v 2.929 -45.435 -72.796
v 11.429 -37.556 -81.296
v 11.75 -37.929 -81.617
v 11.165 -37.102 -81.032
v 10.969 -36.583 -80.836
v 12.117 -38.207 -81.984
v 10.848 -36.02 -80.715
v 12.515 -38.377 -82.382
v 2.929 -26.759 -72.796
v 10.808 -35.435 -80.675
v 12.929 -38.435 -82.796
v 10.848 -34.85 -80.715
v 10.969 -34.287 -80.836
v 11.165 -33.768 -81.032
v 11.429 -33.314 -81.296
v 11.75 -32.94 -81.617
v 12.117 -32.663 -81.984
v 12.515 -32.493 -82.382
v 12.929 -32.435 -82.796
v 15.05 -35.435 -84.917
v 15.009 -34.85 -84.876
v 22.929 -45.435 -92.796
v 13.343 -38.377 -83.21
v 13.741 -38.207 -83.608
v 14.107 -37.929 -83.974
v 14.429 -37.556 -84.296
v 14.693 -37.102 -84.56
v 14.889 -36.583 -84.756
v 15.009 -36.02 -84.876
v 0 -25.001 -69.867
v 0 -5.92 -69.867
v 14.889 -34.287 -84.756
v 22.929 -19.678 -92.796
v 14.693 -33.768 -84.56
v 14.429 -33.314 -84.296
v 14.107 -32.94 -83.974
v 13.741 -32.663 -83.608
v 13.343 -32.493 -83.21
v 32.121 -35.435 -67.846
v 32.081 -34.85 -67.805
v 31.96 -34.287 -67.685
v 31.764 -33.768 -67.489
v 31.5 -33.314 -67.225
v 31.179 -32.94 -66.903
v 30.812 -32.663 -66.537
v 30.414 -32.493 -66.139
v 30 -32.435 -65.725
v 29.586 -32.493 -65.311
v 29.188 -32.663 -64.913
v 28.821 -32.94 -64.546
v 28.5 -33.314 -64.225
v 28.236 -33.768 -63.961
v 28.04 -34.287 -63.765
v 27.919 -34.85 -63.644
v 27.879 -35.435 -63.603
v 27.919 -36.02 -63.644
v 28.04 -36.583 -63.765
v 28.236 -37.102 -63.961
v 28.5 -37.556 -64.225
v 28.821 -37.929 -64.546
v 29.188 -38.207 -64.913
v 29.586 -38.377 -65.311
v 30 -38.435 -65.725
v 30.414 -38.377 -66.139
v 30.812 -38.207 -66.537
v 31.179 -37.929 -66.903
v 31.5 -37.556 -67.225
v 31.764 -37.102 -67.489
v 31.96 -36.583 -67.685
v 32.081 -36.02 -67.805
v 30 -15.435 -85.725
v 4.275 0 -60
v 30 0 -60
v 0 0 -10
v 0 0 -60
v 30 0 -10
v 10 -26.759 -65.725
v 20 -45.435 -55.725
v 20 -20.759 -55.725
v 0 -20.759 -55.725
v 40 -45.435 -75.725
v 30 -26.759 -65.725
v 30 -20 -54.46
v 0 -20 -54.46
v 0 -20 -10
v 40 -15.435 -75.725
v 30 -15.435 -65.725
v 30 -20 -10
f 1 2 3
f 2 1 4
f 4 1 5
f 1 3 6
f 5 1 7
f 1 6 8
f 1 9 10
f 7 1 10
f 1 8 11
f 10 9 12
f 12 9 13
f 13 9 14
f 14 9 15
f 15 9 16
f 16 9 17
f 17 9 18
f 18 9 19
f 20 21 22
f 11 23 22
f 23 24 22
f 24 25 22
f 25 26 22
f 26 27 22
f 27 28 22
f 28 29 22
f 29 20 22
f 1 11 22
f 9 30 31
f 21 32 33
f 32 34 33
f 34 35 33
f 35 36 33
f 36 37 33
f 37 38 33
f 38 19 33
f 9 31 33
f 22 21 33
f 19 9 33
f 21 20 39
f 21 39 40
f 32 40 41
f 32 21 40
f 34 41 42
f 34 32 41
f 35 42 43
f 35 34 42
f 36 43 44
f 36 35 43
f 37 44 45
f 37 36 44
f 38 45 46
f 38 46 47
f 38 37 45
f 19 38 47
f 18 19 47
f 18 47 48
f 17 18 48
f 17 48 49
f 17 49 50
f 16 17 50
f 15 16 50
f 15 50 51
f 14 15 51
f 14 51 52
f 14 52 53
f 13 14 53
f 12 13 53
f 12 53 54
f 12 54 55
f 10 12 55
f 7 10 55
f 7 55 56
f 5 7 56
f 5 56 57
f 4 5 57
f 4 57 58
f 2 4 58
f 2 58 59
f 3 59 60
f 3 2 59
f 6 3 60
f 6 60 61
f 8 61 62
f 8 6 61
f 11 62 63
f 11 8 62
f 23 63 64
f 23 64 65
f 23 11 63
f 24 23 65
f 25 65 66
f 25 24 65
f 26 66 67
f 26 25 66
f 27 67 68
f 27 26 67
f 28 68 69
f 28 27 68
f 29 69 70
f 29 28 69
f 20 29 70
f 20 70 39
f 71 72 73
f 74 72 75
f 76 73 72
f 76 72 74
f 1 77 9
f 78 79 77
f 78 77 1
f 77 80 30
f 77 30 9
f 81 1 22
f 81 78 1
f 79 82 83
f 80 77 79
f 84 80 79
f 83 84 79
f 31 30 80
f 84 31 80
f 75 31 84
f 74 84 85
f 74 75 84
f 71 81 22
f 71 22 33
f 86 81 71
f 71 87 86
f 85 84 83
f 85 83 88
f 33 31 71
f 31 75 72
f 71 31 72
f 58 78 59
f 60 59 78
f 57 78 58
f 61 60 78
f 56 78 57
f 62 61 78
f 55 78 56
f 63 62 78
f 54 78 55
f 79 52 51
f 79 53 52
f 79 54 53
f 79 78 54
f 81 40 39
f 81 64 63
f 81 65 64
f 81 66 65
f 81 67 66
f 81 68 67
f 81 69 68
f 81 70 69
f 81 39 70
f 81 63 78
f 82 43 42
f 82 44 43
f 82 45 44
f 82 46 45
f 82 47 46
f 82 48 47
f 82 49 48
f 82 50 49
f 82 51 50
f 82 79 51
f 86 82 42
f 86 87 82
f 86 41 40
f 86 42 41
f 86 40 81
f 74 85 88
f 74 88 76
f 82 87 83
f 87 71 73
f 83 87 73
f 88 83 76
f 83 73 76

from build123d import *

# Parameters (mm, degrees)
SALIENTE_EXTRUIR2_DEPTH    = 30
CROQUIS3_W                 = 60.629420227
CROQUIS3_H                 = 60.965705304
CORTAR_EXTRUIR1_DEPTH      = 30
CROQUIS4_R                 = 3
CORTAR_EXTRUIR2_DEPTH      = 88.482529848
CROQUIS5_W                 = 28.284271248
CROQUIS5_H                 = 30
SALIENTE_EXTRUIR3_DEPTH    = 14.142136
SALIENTE_EXTRUIR4_DEPTH    = 10
CROQUIS7_W                 = 23.581736244
CROQUIS7_H                 = 30.206171788
CORTAR_EXTRUIR3_DEPTH      = 60
CROQUIS8_R                 = 3
CORTAR_EXTRUIR4_DEPTH      = 99.7393004
CROQUIS10_W                = 79.072347139
CROQUIS10_H                = 56.401254602
CORTAR_EXTRUIR5_DEPTH      = 50
CORTAR_EXTRUIR6_DEPTH      = 66
CORTAR_EXTRUIR6_DEPTH_BACK = 97
CROQUIS11_W                = 135.934764717
CROQUIS11_H                = 98.230231438


with BuildPart() as part:
    # Croquis2 → Saliente-Extruir2 (new body)
    with BuildSketch(Plane(origin=(0, 0, 0), x_dir=(0, 0, -1), z_dir=(1, 0, 0))):
        Polygon((0, 0), (-50, 0), (-75.724787771, -15.434872663), (-75.724787771, -45.434872663), (-55.724787771, -45.434872663), (-55.724787771, -26.758680242), (-44.460320701, -20), (0, -20), align=None)
    extrude(amount=SALIENTE_EXTRUIR2_DEPTH)

    # Croquis3 → Cortar-Extruir1 (cut)
    with BuildSketch(Plane(origin=(-22.862393886, 0, 22.862393886), x_dir=(0.7071067811865462, 0, 0.7071067811865488), z_dir=(-0.7071067811865488, 0, 0.7071067811865462))):
        with Locations((51.516510193, -19.86952732)):
            Rectangle(CROQUIS3_W, CROQUIS3_H)
    extrude(amount=CORTAR_EXTRUIR1_DEPTH, mode=Mode.SUBTRACT)

    # Croquis4 → Cortar-Extruir2 (cut, through all)
    with BuildSketch(Plane(origin=(-22.862393886, 0, 22.862393886), x_dir=(0.7071067811865461, 0, 0.7071067811865489), z_dir=(-0.7071067811865489, 0, 0.7071067811865461))):
        with Locations((60.616578749, -34.226076292)):
            Circle(CROQUIS4_R)
    extrude(amount=-CORTAR_EXTRUIR2_DEPTH, mode=Mode.SUBTRACT)

    # Croquis5 → Saliente-Extruir3 (add)
    with BuildSketch(Plane(origin=(-22.862393886, 0, 22.862393886), x_dir=(0.7071067811865461, 0, 0.7071067811865489), z_dir=(-0.7071067811865489, 0, 0.7071067811865461))):
        with Locations((60.616578749, -30.434872663)):
            Rectangle(CROQUIS5_W, CROQUIS5_H)
    extrude(amount=-SALIENTE_EXTRUIR3_DEPTH)

    # Croquis6 → Saliente-Extruir4 (add)
    with BuildSketch(Plane(origin=(-22.862393886, 0, 22.862393886), x_dir=(0.7071067811865461, 0, 0.7071067811865489), z_dir=(-0.7071067811865489, 0, 0.7071067811865461))):
        Polygon((32.332307501, -20.758680242), (46.474443125, -26.758680242), (46.474443125, -45.434872663), (74.758714373, -45.434872663), (74.758714373, -15.434872663), (38.378370617, 0), (32.332307501, 0), align=None)
    extrude(amount=SALIENTE_EXTRUIR4_DEPTH)

    # Croquis7 → Cortar-Extruir3 (cut)
    with BuildSketch(Plane(origin=(0, 0, 0), x_dir=(1, 0, 0), z_dir=(0, 1, 0))):
        with Locations((-11.790868122, -58.05803285)):
            Rectangle(CROQUIS7_W, CROQUIS7_H)
    extrude(amount=-CORTAR_EXTRUIR3_DEPTH, mode=Mode.SUBTRACT)

    # Croquis8 → Cortar-Extruir4 (cut, through all)
    with BuildSketch(Plane(origin=(-29.933461698, 0, 29.933461698), x_dir=(0.707106781186546, 0, 0.7071067811865491), z_dir=(-0.7071067811865491, 0, 0.707106781186546))):
        with Locations((60.616578749, -35.434872663)):
            Circle(CROQUIS8_R)
    extrude(amount=-CORTAR_EXTRUIR4_DEPTH, mode=Mode.SUBTRACT)

    # Croquis10 → Cortar-Extruir5 (cut)
    with BuildSketch(Plane(origin=(0, 22.058823529, 13.235294118), x_dir=(1, 0, 0), z_dir=(0, 0.8574929257125444, 0.5144957554275262))):
        with Locations((7.523719949, -68.590647859)):
            Rectangle(CROQUIS10_W, CROQUIS10_H)
    extrude(amount=CORTAR_EXTRUIR5_DEPTH, mode=Mode.SUBTRACT)


with BuildPart() as body_2:
    # Simetría3: mirrored copy
    add(part.part.mirror(Plane(origin=(0, 0, -5), x_dir=(1, 0, 0), z_dir=(0, 0, -1))))


with BuildPart() as part_1:
    add(part.part)

    # Croquis11 → Cortar-Extruir6 (cut, two sides: drawn at the far end of the back side and taken through both)
    with BuildSketch(Plane.XZ.offset(20).offset(-CORTAR_EXTRUIR6_DEPTH_BACK)):
        with Locations((20.973016289, 43.122891159)):
            Rectangle(CROQUIS11_W, CROQUIS11_H)
    extrude(amount=CORTAR_EXTRUIR6_DEPTH + CORTAR_EXTRUIR6_DEPTH_BACK, mode=Mode.SUBTRACT)


solid = body_2.part
